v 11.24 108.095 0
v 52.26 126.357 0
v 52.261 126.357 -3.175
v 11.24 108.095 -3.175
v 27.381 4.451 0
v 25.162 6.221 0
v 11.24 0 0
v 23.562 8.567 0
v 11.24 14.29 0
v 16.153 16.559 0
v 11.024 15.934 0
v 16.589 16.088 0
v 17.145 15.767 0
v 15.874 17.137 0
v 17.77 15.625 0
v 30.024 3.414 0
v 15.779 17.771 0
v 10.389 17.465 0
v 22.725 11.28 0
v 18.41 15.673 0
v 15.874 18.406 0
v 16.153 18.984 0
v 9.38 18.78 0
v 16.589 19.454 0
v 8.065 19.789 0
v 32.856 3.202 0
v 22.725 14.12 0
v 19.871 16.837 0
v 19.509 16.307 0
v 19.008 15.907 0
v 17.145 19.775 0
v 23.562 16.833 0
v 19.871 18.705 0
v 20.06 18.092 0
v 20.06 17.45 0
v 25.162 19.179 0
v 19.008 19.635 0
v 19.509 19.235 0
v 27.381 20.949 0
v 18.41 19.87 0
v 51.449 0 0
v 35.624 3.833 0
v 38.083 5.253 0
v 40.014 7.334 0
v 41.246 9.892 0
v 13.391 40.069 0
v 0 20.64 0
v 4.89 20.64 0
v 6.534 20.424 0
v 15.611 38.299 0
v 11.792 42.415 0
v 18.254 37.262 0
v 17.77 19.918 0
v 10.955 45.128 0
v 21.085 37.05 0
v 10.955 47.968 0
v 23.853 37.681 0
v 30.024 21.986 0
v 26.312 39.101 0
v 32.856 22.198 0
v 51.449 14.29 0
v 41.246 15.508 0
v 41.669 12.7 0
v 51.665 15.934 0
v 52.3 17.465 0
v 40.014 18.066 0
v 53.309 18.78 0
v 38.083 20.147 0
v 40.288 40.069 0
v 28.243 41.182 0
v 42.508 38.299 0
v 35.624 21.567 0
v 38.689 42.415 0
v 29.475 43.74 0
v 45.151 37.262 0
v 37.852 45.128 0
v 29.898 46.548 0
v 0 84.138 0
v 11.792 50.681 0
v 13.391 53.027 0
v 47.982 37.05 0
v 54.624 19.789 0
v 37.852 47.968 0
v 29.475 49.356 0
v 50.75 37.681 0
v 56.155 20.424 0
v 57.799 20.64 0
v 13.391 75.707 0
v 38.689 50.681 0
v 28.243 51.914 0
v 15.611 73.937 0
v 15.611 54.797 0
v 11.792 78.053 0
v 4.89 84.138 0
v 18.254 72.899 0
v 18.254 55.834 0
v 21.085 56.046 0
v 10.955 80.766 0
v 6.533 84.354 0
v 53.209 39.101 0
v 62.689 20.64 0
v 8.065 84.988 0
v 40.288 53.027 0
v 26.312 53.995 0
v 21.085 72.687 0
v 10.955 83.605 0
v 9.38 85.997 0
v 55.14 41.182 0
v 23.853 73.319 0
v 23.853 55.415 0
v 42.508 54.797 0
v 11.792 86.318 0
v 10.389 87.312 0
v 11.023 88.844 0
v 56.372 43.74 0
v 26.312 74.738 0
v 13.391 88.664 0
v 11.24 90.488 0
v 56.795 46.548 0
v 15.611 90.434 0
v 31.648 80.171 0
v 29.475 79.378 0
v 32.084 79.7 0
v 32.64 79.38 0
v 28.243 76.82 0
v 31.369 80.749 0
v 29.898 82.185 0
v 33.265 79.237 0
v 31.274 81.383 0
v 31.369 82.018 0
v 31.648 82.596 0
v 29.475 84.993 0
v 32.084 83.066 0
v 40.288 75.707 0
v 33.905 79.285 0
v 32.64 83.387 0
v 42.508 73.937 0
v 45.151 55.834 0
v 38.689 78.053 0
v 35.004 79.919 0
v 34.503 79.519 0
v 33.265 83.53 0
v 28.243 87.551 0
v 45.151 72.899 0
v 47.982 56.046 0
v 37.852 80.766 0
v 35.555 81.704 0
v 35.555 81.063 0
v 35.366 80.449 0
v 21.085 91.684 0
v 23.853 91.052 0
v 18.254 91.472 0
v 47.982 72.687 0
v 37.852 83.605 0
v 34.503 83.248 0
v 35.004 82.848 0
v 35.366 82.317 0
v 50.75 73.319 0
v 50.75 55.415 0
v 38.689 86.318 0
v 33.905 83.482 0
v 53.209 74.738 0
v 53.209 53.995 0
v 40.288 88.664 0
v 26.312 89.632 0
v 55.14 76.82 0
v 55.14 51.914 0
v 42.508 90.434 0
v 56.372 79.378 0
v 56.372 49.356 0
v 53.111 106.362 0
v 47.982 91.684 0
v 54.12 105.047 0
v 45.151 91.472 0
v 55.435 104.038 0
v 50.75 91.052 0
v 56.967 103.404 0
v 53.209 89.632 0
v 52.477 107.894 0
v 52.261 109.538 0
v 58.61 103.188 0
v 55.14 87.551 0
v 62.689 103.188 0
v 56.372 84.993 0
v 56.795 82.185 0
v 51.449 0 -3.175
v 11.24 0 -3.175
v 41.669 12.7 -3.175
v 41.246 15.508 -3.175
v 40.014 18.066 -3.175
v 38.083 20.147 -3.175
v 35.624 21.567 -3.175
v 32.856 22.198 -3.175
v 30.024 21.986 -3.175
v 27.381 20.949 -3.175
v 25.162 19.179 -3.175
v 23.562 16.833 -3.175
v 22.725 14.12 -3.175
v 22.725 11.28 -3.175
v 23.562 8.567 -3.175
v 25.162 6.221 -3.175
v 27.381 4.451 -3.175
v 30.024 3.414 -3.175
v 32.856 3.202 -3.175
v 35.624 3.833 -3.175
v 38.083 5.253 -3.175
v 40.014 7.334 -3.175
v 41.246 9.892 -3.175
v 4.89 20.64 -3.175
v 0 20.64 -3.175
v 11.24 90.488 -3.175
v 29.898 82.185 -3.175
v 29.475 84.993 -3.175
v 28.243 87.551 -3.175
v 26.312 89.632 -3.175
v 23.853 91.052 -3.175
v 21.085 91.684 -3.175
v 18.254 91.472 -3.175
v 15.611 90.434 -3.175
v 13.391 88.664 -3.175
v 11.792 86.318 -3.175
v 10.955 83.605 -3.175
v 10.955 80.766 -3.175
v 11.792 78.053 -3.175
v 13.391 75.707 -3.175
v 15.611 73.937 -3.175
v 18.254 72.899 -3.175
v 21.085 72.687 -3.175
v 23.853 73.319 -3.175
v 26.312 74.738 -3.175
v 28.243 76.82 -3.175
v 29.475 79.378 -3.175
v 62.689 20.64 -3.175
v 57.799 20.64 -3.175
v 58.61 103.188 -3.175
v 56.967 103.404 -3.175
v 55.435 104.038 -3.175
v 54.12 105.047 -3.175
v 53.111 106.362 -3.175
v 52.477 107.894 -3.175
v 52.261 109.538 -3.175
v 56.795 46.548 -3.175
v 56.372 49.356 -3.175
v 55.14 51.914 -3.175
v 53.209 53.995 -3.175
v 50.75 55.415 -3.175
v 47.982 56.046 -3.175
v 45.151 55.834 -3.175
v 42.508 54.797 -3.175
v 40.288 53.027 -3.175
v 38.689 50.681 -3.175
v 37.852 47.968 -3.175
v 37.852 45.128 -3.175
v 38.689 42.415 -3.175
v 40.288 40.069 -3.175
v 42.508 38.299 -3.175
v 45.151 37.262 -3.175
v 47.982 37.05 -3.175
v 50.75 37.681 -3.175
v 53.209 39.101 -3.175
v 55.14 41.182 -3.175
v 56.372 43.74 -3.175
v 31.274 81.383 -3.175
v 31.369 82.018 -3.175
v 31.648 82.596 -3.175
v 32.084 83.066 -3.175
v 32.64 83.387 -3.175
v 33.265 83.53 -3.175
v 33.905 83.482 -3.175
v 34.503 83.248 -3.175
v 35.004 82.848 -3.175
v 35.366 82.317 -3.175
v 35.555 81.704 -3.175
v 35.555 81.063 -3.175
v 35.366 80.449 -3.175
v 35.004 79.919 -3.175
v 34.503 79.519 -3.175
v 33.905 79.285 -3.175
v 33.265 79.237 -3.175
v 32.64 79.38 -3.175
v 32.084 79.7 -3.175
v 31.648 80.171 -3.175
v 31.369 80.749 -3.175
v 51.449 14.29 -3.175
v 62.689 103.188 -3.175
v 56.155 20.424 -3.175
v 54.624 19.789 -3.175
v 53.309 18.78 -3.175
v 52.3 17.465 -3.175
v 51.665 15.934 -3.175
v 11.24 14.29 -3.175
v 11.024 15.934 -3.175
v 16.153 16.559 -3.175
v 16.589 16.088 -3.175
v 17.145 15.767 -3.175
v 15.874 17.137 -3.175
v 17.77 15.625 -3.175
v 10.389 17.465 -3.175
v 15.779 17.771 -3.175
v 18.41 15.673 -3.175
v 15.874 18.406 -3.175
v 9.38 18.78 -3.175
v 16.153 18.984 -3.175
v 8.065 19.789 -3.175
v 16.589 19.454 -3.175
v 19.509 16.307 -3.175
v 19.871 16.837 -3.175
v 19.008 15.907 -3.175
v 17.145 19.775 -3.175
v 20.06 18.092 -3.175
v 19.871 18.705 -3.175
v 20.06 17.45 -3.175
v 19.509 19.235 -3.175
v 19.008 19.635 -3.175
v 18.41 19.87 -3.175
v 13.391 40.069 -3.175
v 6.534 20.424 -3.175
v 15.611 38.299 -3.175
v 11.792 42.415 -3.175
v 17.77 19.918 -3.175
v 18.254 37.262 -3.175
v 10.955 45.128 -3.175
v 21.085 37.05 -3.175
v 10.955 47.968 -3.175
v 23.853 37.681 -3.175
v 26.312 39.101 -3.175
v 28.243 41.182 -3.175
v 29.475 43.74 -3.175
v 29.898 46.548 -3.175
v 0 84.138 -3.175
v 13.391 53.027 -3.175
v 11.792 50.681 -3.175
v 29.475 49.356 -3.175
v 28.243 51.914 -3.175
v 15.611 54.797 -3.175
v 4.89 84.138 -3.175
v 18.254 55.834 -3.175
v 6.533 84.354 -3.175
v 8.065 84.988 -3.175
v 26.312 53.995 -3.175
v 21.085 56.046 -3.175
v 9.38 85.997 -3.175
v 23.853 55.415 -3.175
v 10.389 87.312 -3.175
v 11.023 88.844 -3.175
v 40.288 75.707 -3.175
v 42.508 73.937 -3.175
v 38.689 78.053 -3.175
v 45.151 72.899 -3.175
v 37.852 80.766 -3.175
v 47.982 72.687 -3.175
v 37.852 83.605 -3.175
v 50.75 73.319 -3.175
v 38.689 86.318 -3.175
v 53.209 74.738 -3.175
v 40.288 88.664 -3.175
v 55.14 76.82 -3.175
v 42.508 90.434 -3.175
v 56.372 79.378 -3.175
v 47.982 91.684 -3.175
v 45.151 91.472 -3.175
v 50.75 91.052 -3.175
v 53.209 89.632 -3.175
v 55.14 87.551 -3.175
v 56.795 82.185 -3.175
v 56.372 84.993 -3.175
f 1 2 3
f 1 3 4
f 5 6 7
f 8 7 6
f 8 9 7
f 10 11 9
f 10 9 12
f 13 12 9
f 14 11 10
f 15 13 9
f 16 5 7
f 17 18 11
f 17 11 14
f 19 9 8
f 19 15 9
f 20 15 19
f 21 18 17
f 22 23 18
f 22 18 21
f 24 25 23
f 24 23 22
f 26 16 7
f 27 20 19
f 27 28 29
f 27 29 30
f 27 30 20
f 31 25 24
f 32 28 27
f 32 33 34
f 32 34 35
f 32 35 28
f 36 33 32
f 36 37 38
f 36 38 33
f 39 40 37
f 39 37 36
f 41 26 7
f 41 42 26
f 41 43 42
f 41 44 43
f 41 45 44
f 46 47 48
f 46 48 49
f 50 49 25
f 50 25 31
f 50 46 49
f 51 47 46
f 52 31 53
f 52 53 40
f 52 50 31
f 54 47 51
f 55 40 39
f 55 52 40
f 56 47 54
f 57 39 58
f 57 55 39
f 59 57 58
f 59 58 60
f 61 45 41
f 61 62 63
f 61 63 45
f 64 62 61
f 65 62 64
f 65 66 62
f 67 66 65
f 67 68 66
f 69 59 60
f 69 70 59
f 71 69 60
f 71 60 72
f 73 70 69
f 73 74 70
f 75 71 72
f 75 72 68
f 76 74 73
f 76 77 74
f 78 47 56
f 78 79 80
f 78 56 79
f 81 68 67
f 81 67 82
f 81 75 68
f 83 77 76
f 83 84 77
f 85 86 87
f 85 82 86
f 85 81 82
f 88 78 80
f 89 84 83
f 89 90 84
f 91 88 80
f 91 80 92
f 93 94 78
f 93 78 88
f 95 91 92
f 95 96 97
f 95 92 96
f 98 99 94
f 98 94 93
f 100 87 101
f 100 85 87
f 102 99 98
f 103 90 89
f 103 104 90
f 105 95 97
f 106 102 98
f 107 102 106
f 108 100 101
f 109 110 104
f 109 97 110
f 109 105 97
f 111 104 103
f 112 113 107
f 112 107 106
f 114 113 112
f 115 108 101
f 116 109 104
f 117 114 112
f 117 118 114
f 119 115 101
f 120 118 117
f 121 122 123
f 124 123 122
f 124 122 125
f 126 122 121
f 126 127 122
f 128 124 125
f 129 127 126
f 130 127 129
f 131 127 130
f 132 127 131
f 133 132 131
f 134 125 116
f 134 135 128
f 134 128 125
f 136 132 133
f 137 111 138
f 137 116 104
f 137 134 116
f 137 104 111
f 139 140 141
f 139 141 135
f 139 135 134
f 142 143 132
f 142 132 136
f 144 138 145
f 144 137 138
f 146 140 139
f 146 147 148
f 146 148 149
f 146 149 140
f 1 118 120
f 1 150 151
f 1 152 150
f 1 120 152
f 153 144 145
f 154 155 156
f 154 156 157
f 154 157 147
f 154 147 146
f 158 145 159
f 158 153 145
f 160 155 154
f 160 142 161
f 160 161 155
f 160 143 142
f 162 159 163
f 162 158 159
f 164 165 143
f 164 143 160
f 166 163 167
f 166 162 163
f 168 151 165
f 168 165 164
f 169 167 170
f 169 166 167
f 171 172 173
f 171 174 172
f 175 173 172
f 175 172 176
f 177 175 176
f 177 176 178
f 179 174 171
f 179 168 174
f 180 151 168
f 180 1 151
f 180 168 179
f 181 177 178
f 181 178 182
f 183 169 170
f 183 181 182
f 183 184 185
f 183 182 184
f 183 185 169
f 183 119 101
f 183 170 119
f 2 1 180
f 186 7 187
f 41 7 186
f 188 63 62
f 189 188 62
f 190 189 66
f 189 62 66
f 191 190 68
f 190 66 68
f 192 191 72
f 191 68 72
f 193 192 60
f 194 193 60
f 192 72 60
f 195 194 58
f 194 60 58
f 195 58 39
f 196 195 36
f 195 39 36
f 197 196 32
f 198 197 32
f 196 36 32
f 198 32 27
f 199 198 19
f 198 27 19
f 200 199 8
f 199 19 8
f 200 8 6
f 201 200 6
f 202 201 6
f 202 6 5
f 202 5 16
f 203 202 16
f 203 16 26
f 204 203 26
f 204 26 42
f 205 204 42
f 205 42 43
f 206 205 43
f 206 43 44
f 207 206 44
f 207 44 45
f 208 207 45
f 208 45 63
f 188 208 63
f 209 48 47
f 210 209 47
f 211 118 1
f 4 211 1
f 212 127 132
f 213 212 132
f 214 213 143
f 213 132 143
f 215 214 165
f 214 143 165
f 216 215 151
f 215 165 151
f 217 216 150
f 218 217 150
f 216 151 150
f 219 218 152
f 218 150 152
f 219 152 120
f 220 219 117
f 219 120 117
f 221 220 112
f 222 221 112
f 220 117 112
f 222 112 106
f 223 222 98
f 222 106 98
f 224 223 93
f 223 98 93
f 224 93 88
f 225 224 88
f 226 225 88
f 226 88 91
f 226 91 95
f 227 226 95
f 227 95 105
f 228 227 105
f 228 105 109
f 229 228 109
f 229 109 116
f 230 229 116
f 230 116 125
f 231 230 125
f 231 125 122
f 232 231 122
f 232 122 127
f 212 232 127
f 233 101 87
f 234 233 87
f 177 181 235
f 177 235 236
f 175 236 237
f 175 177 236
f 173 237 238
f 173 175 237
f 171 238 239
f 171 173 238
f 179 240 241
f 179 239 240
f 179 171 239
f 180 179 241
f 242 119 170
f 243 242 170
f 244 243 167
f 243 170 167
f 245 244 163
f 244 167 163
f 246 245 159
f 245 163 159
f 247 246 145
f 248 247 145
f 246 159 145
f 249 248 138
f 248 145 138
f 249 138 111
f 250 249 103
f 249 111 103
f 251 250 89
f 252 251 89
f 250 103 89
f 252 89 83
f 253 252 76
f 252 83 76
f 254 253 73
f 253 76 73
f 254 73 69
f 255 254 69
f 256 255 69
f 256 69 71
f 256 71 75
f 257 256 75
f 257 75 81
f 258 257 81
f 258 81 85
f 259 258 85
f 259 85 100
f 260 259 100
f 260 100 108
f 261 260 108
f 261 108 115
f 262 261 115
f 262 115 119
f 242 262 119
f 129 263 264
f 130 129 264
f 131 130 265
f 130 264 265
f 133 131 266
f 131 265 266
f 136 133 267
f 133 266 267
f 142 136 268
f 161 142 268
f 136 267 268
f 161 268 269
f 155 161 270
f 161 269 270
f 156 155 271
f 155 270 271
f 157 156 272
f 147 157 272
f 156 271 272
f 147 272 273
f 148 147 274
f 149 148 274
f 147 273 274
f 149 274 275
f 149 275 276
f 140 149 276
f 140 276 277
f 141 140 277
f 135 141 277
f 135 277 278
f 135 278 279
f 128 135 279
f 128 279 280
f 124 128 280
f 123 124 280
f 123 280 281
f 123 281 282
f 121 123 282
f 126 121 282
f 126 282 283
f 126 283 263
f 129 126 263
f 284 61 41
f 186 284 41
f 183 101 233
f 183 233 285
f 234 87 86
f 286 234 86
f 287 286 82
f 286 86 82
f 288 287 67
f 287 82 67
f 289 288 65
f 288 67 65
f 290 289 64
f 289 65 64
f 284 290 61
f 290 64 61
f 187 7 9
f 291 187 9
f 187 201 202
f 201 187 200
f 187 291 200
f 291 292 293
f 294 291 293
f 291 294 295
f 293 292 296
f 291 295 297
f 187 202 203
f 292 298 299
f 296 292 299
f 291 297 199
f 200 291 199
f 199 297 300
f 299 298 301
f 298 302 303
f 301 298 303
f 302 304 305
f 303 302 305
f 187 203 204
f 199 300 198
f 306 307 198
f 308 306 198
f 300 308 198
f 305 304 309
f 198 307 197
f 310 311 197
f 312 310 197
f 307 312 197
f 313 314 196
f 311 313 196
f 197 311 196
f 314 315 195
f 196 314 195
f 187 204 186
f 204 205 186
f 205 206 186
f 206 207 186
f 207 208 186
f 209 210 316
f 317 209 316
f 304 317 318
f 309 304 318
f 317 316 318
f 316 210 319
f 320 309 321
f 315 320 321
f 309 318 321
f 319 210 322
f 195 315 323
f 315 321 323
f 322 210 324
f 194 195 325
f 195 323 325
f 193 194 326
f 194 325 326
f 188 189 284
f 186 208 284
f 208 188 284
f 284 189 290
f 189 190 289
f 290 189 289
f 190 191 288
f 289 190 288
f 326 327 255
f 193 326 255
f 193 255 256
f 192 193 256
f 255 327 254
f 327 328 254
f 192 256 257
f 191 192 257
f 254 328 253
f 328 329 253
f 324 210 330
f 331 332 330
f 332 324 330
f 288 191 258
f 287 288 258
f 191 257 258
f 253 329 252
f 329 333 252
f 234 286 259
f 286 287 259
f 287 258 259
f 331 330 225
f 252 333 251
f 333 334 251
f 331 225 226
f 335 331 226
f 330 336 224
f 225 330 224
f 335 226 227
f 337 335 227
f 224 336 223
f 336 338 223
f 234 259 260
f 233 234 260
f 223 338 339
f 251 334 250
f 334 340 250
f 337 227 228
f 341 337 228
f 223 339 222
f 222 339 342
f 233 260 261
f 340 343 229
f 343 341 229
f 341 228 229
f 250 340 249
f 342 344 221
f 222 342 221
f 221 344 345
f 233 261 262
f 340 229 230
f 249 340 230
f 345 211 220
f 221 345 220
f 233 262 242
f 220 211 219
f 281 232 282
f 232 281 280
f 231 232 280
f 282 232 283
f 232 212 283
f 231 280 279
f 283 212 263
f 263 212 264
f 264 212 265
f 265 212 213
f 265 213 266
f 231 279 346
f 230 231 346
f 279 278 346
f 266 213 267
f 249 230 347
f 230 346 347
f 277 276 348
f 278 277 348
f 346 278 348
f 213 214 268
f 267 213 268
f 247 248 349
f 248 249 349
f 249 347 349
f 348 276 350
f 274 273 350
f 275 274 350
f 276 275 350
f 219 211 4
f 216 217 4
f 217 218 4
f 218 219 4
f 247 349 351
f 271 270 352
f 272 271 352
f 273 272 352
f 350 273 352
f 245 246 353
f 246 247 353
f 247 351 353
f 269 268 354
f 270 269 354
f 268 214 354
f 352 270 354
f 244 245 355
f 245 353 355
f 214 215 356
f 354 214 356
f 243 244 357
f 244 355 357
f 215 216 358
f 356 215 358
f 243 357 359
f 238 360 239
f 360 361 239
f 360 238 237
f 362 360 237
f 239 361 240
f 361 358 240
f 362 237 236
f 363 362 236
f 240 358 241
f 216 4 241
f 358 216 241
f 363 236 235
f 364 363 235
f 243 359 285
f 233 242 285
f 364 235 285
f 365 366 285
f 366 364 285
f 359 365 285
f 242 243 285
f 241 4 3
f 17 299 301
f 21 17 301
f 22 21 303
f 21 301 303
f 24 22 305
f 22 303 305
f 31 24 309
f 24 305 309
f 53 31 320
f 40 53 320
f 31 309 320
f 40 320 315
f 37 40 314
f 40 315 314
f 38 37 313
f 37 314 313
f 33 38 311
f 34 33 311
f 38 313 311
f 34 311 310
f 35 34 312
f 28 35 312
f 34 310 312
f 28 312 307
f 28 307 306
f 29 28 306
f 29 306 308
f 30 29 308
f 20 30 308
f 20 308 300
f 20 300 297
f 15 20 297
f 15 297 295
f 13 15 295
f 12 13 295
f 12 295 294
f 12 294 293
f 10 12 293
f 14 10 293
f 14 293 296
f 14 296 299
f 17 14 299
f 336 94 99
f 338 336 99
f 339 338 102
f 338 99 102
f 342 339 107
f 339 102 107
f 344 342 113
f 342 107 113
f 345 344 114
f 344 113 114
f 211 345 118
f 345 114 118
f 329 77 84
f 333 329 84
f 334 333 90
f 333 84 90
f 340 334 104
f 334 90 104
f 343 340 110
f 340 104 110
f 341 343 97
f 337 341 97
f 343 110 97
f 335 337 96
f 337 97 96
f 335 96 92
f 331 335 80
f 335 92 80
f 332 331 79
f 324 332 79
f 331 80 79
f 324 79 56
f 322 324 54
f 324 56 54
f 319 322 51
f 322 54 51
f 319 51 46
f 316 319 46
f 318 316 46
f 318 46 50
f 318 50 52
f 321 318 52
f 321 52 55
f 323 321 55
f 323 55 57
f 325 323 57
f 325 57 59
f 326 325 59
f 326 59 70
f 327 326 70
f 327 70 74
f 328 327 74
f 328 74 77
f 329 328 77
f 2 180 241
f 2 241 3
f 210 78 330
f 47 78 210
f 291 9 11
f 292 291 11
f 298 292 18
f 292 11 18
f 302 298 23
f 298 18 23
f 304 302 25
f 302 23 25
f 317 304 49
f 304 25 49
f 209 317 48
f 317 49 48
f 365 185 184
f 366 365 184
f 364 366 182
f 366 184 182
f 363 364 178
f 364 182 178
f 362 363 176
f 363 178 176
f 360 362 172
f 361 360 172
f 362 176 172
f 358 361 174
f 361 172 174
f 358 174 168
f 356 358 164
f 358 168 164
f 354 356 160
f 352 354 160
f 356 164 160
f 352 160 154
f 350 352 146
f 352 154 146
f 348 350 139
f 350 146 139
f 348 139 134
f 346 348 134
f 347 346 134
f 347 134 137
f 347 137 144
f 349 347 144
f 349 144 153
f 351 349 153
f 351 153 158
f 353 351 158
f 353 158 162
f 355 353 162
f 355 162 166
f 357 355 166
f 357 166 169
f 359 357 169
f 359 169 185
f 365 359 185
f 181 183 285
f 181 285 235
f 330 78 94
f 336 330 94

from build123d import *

# Parameters (mm, degrees)
BOSS_EXTRUDE1_DEPTH   = 3.175
SKETCH2_R             = 9.525
CUT_EXTRUDE1_DEPTH    = 4.175
F_6_CLEARANCE_HOLE1_D = 4.3053
CUT_EXTRUDE2_DEPTH    = 4.175
F_6_CLEARANCE_HOLE2_D = 4.3053


with BuildPart() as part:
    # Sketch1 → Boss-Extrude1 (new body)
    with BuildSketch(Plane.XY):
        Polygon((0, 103.090949096), (0, 0), (62.688793586, 0), (62.688793586, 131), align=None)
    extrude(amount=-BOSS_EXTRUDE1_DEPTH)

    # Sketch2 → Cut-Extrude1 (cut, through all)
    with BuildSketch(Plane.XY):
        with Locations((32.143907641, 12.7)):
            Circle(SKETCH2_R)
        with Locations((47.270490427, 46.548006151)):
            Circle(SKETCH2_R)
        with Locations((47.270490427, 82.18542385)):
            Circle(SKETCH2_R)
        with Locations((20.373235059, 82.18542385)):
            Circle(SKETCH2_R)
        with Locations((20.373235059, 46.548006151)):
            Circle(SKETCH2_R)
    extrude(amount=-CUT_EXTRUDE1_DEPTH, mode=Mode.SUBTRACT)

    # #6 Clearance Hole1 (through all)
    with Locations(Plane.XY):
        with Locations((58.6105, 14.2875), (4.8895, 14.2875), (4.8895, 90.4875), (58.6105, 109.5375)):
            Hole(F_6_CLEARANCE_HOLE1_D / 2)

    # Sketch5 → Cut-Extrude2 (cut, through all)
    with BuildSketch(Plane.XY):
        with BuildLine():
            Line((0, 0), (11.24, 0))
            Line((11.24, 0), (11.24, 14.29))
            ThreePointArc((11.24, 14.29), (9.380128061, 18.780128061), (4.89, 20.64))
            Line((4.89, 20.64), (0, 20.64))
            Line((0, 20.64), (0, 0))
        make_face()
        with BuildLine():
            Line((51.448793586, 14.29), (51.448793586, 0))
            Line((51.448793586, 0), (62.688793586, 0))
            Line((62.688793586, 0), (62.688793586, 20.64))
            Line((62.688793586, 20.64), (57.798793586, 20.64))
            ThreePointArc((57.798793586, 20.64), (53.308665525, 18.780128061), (51.448793586, 14.29))
        make_face()
        with BuildLine():
            Line((0, 103.090949096), (0, 84.1375))
            Line((0, 84.1375), (4.8895, 84.1375))
            ThreePointArc((4.8895, 84.1375), (9.379628061, 85.997371939), (11.2395, 90.4875))
            Line((11.2395, 90.4875), (11.2395, 108.094774496))
            Line((11.2395, 108.094774496), (0, 103.090949096))
        make_face()
        with BuildLine():
            Line((62.688793586, 131), (62.688793586, 103.1875))
            Line((62.688793586, 103.1875), (58.6105, 103.1875))
            ThreePointArc((58.6105, 103.1875), (54.120371939, 105.047371939), (52.2605, 109.5375))
            Line((52.2605, 109.5375), (52.2605, 126.357323696))
            Line((52.2605, 126.357323696), (62.688793586, 131))
        make_face()
    extrude(amount=-CUT_EXTRUDE2_DEPTH, mode=Mode.SUBTRACT)

    # #6 Clearance Hole2 (through all)
    with Locations(Plane(origin=(31.750004441, 0, 3.175), x_dir=(1, 0, 0), z_dir=(0, 0, 1))):
        with Locations((1.676331213, 81.383391323), (-13.818696068, 17.771227958)):
            Hole(F_6_CLEARANCE_HOLE2_D / 2)


solid = part.part
